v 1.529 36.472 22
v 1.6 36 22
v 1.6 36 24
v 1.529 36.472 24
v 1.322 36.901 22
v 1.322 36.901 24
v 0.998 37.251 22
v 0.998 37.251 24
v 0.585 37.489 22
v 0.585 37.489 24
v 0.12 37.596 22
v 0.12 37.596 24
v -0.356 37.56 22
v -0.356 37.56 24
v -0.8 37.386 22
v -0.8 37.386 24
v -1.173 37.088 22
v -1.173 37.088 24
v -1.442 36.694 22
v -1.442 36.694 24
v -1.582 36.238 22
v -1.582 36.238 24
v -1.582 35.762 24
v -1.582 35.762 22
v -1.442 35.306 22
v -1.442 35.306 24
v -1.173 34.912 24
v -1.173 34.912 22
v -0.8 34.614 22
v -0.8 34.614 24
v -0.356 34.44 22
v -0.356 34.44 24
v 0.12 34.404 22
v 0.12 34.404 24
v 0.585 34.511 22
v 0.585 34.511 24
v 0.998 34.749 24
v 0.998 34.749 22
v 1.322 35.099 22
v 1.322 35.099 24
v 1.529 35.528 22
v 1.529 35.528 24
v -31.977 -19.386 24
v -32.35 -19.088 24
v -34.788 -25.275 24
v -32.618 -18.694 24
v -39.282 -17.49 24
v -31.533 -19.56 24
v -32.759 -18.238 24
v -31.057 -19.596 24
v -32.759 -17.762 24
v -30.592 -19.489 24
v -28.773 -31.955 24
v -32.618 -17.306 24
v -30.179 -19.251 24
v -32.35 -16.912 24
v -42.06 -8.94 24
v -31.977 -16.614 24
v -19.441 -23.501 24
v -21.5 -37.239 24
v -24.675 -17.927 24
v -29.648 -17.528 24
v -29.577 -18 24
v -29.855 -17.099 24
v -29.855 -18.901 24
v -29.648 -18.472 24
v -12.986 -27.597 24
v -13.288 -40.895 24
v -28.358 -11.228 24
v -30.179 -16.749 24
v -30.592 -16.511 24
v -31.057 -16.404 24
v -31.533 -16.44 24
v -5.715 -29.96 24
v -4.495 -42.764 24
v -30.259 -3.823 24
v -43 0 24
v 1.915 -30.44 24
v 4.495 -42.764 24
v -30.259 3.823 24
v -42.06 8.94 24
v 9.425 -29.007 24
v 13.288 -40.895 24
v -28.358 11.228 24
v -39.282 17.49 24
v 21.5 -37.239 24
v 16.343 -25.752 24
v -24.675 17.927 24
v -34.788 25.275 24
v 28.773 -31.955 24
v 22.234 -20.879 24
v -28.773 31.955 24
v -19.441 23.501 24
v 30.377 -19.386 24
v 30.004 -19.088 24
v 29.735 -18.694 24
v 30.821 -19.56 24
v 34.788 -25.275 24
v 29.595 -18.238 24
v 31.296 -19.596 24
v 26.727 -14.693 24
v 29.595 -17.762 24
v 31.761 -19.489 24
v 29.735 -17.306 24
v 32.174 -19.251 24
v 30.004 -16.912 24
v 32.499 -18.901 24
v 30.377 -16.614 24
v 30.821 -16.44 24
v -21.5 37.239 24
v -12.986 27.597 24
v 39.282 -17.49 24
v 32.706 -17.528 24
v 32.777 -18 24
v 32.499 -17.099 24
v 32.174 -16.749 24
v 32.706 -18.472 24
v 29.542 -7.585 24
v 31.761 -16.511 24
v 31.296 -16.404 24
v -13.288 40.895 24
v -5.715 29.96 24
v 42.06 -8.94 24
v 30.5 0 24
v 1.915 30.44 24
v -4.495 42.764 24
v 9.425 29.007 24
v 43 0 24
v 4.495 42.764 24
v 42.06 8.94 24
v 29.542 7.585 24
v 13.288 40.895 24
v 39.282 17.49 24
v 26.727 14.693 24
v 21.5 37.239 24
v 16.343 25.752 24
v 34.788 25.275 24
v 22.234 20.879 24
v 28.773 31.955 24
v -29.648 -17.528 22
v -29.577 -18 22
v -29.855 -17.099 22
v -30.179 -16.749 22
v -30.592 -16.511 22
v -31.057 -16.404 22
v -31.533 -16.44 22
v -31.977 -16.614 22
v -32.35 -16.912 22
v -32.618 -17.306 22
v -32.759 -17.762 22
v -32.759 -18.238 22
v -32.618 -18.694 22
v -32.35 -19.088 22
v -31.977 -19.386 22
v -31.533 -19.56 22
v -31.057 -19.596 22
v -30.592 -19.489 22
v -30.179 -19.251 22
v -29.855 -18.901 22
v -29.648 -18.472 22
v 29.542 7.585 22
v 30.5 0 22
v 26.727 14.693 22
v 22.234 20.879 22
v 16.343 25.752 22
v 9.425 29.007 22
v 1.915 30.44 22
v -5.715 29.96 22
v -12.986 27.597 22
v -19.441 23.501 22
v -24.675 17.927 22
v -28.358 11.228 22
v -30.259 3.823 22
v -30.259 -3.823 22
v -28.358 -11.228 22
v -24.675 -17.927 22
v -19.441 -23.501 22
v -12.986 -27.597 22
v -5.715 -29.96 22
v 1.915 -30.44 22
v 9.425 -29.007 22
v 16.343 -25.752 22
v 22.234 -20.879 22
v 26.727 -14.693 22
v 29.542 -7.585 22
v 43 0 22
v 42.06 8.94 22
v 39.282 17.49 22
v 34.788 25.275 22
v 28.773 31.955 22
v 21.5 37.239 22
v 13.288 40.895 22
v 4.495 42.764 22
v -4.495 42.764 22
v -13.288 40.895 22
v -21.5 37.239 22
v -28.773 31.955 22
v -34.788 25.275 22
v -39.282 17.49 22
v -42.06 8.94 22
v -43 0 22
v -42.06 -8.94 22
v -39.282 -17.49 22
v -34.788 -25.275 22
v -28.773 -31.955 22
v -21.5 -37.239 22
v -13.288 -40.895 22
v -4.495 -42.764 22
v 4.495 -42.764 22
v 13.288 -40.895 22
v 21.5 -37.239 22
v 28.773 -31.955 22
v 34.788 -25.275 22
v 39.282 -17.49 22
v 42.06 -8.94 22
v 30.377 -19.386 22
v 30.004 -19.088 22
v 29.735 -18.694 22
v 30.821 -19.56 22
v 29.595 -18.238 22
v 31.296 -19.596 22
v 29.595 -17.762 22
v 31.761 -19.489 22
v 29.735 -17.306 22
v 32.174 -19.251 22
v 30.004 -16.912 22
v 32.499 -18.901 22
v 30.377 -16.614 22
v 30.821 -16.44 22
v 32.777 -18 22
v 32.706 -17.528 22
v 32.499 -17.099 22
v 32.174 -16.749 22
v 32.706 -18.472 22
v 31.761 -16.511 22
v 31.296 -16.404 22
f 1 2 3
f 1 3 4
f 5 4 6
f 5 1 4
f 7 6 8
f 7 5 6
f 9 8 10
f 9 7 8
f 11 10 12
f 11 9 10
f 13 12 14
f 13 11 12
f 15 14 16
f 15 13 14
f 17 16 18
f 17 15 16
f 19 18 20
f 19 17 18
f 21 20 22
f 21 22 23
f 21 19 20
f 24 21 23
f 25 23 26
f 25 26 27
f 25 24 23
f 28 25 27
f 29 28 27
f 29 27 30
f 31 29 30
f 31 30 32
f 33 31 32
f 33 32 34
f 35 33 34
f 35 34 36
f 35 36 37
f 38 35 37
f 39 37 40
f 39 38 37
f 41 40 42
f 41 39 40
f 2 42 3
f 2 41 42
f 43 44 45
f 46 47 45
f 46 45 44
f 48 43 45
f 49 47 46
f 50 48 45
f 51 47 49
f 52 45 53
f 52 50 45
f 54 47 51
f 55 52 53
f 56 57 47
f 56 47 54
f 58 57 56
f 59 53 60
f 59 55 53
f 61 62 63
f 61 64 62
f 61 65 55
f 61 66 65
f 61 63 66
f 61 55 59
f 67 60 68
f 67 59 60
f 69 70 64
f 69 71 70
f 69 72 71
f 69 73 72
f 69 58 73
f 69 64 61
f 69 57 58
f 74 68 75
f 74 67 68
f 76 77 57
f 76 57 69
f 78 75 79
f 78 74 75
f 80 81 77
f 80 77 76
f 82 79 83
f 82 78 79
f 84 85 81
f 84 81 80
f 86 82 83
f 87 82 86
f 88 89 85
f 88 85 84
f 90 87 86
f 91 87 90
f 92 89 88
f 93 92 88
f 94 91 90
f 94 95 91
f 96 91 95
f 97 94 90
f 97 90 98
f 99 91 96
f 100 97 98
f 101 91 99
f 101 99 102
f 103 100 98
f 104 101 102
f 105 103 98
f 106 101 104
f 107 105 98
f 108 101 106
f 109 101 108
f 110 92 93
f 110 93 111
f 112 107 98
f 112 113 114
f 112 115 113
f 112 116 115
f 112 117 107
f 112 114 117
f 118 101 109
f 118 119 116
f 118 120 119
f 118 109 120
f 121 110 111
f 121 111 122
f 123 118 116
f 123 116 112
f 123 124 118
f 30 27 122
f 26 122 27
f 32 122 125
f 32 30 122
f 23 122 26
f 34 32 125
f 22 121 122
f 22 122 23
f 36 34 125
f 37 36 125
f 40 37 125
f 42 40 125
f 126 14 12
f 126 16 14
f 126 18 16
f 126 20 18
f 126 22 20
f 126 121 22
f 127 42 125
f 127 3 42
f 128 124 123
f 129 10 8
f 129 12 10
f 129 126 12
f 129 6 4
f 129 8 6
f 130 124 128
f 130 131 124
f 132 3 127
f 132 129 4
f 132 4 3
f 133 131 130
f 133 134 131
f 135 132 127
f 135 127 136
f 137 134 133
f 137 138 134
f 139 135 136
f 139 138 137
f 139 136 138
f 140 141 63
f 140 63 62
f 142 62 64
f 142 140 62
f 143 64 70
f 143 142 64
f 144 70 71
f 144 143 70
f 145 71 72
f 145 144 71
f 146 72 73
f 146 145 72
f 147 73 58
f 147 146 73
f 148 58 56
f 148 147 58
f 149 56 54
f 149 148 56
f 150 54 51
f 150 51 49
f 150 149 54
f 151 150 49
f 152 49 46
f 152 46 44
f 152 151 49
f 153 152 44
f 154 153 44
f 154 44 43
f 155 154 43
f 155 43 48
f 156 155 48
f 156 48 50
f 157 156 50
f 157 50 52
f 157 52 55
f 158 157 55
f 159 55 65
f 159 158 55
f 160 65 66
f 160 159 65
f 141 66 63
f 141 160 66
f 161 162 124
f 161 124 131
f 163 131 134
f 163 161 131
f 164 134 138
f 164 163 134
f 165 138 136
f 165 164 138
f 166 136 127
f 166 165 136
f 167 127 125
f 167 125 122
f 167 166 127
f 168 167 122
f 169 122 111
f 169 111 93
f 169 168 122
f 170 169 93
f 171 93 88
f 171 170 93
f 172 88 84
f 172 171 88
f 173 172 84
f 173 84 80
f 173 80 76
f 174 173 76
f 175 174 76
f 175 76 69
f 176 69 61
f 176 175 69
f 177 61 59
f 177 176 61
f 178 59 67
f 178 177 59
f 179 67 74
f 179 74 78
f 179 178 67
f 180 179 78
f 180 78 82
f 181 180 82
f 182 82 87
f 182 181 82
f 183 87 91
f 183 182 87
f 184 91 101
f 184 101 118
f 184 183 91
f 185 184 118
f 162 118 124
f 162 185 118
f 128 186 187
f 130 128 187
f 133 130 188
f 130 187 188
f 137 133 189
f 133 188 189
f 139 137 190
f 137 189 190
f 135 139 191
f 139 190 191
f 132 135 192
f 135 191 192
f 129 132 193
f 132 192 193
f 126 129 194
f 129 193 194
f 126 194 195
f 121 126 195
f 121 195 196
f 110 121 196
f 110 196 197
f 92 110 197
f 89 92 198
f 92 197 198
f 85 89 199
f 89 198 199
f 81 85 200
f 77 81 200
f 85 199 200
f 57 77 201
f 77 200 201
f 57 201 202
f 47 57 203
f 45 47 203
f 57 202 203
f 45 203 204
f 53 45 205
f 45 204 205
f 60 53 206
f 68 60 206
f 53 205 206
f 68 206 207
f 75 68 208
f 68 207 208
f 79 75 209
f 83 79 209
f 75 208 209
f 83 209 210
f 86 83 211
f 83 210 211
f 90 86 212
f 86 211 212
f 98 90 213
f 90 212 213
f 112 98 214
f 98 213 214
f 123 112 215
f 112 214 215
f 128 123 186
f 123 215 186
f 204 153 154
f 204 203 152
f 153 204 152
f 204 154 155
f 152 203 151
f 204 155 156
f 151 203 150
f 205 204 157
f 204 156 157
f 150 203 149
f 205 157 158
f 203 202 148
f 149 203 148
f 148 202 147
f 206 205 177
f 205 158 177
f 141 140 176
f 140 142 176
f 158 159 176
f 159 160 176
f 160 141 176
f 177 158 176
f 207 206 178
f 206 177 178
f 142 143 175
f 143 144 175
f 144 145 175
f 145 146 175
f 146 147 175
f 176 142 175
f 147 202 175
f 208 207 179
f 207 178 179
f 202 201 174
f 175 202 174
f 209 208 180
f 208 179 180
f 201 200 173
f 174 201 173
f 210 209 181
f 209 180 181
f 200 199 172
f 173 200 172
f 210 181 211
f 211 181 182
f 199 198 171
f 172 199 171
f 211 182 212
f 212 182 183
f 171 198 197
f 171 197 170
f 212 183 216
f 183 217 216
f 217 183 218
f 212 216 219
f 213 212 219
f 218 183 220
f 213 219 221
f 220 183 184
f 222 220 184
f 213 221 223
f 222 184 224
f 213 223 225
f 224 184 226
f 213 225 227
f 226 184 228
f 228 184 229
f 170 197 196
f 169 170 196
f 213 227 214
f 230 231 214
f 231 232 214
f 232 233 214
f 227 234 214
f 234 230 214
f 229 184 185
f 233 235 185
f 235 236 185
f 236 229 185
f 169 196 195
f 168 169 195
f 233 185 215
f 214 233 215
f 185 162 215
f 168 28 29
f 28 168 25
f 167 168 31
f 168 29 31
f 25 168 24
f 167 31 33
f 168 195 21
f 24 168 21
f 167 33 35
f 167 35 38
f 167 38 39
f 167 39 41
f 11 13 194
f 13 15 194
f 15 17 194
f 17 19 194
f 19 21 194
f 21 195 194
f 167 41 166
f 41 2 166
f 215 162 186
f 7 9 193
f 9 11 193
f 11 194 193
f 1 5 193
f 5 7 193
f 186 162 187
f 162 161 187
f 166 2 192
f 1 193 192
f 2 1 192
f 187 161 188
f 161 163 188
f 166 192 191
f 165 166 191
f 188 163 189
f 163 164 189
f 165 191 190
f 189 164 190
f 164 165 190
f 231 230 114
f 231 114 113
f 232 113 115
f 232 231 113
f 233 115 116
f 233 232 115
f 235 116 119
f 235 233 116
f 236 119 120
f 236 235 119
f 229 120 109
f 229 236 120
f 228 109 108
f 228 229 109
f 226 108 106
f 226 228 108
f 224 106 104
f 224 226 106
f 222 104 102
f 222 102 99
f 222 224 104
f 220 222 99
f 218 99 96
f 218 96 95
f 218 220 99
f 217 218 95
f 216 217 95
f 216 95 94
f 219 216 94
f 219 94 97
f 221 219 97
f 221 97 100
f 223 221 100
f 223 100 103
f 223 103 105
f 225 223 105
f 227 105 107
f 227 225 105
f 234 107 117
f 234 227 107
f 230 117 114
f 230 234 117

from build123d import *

# Parameters (mm, degrees)
SKETCH006_R   = 43
SKETCH006_R_2 = 1.6
SKETCH006_R_3 = 30.5
PAD_DEPTH     = 2


with BuildPart() as part:
    # Sketch006 → Pad (new body)
    with BuildSketch(Plane.XY.offset(22)):
        Circle(SKETCH006_R)
        with Locations((0, 36)):
            Circle(SKETCH006_R_2, mode=Mode.SUBTRACT)
        with Locations((31.176915, -18)):
            Circle(SKETCH006_R_2, mode=Mode.SUBTRACT)
        with Locations((-31.176915, -18)):
            Circle(SKETCH006_R_2, mode=Mode.SUBTRACT)
        Circle(SKETCH006_R_3, mode=Mode.SUBTRACT)
    extrude(amount=PAD_DEPTH)


solid = part.part
